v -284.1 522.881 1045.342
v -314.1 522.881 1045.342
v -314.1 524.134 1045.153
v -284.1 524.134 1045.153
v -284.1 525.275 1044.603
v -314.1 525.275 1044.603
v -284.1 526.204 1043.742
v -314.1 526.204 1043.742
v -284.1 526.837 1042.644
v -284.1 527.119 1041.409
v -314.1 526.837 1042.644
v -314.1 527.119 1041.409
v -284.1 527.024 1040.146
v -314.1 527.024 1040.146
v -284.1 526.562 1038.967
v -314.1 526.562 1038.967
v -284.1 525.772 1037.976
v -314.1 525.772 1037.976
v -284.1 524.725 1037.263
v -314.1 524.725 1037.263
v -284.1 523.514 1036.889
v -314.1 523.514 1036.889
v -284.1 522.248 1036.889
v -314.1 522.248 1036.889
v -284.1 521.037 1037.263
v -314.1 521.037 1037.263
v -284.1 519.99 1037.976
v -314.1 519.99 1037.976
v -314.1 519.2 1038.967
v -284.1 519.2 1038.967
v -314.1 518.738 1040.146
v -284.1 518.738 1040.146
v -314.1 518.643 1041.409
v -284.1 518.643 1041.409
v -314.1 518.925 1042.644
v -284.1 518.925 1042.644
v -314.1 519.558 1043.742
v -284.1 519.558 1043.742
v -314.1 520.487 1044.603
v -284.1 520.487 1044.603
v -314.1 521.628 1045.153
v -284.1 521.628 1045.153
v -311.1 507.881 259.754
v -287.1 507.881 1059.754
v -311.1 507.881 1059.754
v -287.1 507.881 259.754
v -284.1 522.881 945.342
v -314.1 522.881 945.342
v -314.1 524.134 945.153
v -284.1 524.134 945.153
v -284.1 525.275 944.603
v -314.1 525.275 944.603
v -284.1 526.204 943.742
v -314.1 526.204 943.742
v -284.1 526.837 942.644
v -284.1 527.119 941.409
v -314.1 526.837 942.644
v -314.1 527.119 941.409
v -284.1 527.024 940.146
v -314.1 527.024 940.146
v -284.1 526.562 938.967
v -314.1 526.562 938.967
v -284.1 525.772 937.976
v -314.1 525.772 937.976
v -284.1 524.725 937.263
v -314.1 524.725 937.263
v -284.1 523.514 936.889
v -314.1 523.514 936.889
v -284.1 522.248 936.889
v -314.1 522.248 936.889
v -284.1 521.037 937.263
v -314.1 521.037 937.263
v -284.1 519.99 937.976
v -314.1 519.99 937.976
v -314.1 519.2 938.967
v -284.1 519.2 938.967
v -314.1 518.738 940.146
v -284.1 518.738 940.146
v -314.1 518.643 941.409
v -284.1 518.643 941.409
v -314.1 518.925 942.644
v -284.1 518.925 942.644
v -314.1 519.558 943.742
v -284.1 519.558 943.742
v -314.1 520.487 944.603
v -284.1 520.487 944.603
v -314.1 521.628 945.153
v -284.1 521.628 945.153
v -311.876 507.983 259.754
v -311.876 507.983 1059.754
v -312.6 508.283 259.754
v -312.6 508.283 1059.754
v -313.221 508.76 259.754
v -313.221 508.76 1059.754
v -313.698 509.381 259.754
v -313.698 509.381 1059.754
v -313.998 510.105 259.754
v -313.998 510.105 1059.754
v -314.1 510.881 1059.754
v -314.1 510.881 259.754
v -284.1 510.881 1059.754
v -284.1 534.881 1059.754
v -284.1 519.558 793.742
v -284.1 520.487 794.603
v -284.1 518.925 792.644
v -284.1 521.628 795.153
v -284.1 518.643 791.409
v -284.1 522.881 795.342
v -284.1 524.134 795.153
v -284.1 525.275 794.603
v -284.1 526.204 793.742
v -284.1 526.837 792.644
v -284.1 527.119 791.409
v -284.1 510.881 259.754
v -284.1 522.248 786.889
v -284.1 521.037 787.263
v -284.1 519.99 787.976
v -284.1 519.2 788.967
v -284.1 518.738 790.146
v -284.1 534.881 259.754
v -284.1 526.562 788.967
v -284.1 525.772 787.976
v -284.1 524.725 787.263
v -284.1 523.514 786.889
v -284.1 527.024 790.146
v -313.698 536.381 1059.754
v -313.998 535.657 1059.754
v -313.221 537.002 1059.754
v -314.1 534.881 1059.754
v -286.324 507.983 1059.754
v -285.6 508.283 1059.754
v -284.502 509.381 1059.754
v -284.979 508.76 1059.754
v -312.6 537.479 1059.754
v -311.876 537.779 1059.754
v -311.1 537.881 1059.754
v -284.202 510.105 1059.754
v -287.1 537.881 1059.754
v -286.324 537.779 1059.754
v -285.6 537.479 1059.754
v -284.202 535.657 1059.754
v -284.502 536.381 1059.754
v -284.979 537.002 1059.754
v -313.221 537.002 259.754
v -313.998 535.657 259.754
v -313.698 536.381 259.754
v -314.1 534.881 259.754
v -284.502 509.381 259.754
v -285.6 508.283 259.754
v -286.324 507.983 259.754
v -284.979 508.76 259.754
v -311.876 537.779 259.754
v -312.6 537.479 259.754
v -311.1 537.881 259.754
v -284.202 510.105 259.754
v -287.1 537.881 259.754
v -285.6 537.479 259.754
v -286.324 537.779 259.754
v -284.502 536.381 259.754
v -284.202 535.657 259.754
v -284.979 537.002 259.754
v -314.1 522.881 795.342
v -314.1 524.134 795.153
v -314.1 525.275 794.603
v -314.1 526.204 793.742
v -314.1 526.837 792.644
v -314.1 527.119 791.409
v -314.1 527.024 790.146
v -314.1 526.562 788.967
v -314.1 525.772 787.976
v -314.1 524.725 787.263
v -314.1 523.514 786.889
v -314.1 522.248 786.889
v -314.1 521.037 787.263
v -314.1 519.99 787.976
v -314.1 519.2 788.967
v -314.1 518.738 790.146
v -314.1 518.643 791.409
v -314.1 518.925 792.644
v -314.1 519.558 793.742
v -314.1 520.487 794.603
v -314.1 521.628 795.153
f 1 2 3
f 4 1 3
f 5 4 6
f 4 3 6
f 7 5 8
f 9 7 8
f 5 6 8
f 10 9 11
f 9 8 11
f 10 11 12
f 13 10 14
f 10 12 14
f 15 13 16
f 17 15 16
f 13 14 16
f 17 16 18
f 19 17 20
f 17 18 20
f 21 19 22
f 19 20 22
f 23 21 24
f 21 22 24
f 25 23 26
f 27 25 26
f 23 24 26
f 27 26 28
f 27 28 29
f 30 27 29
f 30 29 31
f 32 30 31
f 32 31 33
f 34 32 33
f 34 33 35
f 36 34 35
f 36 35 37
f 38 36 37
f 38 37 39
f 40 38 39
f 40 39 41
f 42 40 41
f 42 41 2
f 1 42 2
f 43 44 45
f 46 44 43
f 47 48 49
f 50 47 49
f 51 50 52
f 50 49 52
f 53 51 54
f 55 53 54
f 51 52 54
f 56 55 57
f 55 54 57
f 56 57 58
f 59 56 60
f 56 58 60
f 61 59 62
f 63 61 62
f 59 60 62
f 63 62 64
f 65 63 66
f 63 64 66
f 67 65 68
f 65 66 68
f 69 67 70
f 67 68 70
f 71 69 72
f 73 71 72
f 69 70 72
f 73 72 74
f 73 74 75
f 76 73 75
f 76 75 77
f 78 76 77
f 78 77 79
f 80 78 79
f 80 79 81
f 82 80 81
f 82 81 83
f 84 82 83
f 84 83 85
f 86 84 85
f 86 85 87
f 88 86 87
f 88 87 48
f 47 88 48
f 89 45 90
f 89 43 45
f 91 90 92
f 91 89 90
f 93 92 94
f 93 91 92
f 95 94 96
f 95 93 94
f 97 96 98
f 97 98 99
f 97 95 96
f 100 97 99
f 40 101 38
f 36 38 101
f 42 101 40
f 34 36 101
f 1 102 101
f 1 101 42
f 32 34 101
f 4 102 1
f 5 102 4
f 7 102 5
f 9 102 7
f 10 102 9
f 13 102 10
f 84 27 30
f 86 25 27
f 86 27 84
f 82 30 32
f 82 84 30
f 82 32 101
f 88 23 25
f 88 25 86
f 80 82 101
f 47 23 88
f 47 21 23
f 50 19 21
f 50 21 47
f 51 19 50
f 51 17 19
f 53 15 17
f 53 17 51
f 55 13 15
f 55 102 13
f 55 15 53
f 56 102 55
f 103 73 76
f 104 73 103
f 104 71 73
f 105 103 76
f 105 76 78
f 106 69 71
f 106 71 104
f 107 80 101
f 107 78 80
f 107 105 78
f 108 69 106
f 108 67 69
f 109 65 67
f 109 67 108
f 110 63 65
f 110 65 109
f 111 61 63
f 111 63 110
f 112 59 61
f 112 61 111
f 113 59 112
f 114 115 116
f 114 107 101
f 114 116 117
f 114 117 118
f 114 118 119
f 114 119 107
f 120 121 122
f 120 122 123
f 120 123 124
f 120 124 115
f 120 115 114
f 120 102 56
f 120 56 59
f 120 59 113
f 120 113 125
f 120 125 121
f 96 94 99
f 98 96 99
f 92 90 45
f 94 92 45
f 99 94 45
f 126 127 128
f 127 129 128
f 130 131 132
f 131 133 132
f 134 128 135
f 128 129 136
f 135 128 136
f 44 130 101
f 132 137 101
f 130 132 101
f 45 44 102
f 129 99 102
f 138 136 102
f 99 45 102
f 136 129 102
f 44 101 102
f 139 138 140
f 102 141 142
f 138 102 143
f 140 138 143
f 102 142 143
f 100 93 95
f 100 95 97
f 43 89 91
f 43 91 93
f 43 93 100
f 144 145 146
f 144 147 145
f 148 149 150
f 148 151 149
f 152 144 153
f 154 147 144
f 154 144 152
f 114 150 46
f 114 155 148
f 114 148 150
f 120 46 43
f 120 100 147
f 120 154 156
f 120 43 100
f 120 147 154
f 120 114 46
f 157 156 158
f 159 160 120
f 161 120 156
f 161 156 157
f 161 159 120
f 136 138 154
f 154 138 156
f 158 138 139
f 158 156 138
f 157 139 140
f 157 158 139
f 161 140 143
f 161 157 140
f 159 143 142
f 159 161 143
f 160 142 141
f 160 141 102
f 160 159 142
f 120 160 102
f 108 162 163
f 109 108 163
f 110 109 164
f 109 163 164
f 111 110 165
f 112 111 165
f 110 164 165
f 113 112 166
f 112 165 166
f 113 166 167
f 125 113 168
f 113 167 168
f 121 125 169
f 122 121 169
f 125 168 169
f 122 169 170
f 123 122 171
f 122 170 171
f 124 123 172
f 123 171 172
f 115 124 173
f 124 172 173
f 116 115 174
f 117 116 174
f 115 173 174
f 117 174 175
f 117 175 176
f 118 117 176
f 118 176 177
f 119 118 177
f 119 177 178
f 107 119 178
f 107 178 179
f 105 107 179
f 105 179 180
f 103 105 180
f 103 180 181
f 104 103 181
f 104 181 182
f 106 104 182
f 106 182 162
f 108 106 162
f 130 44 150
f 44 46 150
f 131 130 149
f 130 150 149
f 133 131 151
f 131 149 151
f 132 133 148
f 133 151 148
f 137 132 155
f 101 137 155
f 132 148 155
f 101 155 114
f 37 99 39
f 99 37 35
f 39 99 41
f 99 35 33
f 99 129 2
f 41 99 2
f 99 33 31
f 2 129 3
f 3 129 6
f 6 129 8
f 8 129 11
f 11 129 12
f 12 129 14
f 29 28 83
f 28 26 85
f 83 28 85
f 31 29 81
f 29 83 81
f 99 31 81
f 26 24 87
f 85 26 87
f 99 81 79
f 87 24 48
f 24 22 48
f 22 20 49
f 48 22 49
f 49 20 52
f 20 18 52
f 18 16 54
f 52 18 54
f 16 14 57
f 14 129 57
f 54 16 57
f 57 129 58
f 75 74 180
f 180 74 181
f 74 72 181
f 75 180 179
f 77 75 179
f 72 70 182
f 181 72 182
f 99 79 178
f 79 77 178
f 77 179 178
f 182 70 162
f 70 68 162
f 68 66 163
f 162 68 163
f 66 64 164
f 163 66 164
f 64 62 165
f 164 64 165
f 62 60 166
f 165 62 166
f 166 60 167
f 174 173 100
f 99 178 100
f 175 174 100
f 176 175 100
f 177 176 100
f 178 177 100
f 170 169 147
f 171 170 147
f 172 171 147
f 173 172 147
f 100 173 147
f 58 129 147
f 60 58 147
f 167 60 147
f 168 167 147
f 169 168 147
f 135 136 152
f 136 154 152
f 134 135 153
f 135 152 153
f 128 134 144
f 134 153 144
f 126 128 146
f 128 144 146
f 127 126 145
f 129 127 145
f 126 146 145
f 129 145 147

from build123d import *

# Parameters (mm, degrees)
SKETCH1_W                  = 800
SKETCH1_H                  = 30
BOSS_EXTRUDE1_DEPTH        = 30
F_8_5_8_5_DIAMETER_HOLE1_D = 8.5
FILLET1_R                  = 3


with BuildPart() as part:
    # Sketch1 → Boss-Extrude1 (new body)
    with BuildSketch(Plane(origin=(-284.1, 0, 0), x_dir=(0, 0, -1), z_dir=(1, 0, 0))):
        with Locations((-659.753768995, 522.880996201)):
            Rectangle(SKETCH1_W, SKETCH1_H)
    extrude(amount=-BOSS_EXTRUDE1_DEPTH)

    # Ø8.5 (8.5) Diameter Hole1 (through all)
    with Locations(Plane(origin=(-284.1, 0, 0), x_dir=(0, 0, -1), z_dir=(1, 0, 0))):
        with Locations((-791.091669843, 522.880996201), (-941.091669843, 522.880996201), (-1041.091669843, 522.880996201)):
            Hole(F_8_5_8_5_DIAMETER_HOLE1_D / 2)

    # Fillet1
    fillet1_edges = [part.edges().sort_by_distance(p)[0] for p in [
        (-314.1, 507.880996201, 659.753768995),
        (-314.1, 537.880996201, 659.753768995),
        (-284.1, 507.880996201, 659.753768995),
        (-284.1, 537.880996201, 659.753768995),
    ]]
    fillet(fillet1_edges, radius=FILLET1_R)


solid = part.part
